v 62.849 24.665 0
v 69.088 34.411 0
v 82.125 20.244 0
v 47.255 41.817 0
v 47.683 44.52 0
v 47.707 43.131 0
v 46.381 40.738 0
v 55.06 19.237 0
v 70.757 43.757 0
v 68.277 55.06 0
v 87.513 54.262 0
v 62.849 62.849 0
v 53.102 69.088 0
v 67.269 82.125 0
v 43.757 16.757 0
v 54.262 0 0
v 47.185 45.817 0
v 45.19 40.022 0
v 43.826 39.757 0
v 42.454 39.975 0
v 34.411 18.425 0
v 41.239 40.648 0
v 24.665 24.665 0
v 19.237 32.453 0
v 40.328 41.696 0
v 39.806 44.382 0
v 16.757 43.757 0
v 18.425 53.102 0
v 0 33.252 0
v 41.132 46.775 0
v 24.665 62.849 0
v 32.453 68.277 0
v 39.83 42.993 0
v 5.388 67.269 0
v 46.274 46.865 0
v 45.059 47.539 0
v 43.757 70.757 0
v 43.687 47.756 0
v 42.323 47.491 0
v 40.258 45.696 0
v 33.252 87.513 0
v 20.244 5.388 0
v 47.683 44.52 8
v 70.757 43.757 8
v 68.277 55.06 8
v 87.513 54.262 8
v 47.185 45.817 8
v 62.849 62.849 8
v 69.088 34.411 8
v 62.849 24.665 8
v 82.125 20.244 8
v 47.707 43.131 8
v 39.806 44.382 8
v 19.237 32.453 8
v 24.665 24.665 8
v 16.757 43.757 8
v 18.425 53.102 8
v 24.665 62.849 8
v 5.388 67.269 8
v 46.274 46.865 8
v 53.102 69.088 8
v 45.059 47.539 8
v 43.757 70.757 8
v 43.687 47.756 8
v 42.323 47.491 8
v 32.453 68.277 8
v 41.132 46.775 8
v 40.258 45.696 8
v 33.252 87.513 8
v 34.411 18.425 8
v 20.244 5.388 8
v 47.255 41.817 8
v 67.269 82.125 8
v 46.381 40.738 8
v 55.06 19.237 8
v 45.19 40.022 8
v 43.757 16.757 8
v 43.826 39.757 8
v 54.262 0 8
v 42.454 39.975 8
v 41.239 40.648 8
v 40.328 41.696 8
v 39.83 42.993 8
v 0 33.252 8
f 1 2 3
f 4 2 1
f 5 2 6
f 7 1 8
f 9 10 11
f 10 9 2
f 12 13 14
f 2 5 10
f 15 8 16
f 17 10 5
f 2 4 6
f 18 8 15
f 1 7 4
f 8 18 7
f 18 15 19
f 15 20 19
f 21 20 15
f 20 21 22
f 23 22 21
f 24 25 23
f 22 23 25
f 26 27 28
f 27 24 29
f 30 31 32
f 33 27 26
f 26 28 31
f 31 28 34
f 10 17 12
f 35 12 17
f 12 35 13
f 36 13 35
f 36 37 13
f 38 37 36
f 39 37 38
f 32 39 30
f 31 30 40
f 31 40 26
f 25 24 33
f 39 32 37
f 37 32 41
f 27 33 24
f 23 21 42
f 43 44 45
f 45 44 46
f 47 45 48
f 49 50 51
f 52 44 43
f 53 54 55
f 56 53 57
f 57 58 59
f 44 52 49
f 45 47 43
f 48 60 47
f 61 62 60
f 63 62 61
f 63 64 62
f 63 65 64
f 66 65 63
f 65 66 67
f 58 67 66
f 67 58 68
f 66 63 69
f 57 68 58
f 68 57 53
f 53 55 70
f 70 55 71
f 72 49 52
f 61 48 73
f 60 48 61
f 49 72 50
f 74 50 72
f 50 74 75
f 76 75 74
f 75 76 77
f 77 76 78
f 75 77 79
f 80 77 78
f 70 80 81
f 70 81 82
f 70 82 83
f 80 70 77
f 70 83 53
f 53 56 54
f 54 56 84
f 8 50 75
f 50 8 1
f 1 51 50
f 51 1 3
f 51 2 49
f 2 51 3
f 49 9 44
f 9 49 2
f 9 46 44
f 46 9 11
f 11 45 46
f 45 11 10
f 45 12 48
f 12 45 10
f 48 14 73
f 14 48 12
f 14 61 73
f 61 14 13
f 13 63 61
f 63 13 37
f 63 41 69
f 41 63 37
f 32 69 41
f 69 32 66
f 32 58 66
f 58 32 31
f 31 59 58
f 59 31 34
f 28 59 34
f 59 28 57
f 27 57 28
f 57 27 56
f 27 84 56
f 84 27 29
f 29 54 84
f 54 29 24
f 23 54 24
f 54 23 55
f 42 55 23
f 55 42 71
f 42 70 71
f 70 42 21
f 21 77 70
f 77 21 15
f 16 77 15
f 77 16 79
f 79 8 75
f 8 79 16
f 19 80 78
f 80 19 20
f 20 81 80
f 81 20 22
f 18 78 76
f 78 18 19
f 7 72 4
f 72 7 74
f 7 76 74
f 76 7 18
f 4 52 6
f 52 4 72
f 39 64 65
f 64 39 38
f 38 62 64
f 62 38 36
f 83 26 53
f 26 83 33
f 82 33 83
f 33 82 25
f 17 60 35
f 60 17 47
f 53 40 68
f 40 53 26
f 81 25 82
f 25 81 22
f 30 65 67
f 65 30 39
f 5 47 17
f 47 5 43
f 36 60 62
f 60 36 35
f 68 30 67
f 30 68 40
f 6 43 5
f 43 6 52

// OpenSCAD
$fn = 32;

// ----------------------------------------------------------------------
// Star wheel: 8-point ratchet, R45
// ----------------------------------------------------------------------

// --- parameters (mm) ---
n_points = 8;             // number of points / teeth
r_out = 45;               // tip radius
r_in = 27;                // root radius
bore_r = 4;               // centre bore radius
plate_t = 8;              // plate thickness, Z (extrusion height)
bore_d = 8;               // centre bore diameter
fit_tol = 0.05;           // declared fit tolerance (prompt contract)
free_tol = 0.2;           // declared free tolerance (prompt contract)

profile = [[43.757, 70.757], [33.252, 87.513], [32.453, 68.277], [24.665, 62.849], [5.388, 67.269], [18.425, 53.102], [16.757, 43.757], [0, 33.252], [19.237, 32.453], [24.665, 24.665], [20.244, 5.388], [34.411, 18.425], [43.757, 16.757], [54.262, 0], [55.06, 19.237], [62.849, 24.665], [82.125, 20.244], [69.088, 34.411], [70.757, 43.757], [87.513, 54.262], [68.277, 55.06], [62.849, 62.849], [67.269, 82.125], [53.102, 69.088]];  // primary outline, 24 points, counter clockwise
void_1 = [[47.683, 44.52], [47.185, 45.817], [46.274, 46.865], [45.059, 47.539], [43.687, 47.756], [42.323, 47.491], [41.132, 46.775], [40.258, 45.696], [39.806, 44.382], [39.83, 42.993], [40.328, 41.696], [41.239, 40.648], [42.454, 39.975], [43.826, 39.757], [45.19, 40.022], [46.381, 40.738], [47.255, 41.817], [47.707, 43.131]];  // centre bore, 18 points

// --- the one profile operation ---
difference() {
  linear_extrude(height = plate_t) polygon(points = profile);
  translate([0, 0, -1])
    linear_extrude(height = plate_t + 2) polygon(points = void_1);
}
